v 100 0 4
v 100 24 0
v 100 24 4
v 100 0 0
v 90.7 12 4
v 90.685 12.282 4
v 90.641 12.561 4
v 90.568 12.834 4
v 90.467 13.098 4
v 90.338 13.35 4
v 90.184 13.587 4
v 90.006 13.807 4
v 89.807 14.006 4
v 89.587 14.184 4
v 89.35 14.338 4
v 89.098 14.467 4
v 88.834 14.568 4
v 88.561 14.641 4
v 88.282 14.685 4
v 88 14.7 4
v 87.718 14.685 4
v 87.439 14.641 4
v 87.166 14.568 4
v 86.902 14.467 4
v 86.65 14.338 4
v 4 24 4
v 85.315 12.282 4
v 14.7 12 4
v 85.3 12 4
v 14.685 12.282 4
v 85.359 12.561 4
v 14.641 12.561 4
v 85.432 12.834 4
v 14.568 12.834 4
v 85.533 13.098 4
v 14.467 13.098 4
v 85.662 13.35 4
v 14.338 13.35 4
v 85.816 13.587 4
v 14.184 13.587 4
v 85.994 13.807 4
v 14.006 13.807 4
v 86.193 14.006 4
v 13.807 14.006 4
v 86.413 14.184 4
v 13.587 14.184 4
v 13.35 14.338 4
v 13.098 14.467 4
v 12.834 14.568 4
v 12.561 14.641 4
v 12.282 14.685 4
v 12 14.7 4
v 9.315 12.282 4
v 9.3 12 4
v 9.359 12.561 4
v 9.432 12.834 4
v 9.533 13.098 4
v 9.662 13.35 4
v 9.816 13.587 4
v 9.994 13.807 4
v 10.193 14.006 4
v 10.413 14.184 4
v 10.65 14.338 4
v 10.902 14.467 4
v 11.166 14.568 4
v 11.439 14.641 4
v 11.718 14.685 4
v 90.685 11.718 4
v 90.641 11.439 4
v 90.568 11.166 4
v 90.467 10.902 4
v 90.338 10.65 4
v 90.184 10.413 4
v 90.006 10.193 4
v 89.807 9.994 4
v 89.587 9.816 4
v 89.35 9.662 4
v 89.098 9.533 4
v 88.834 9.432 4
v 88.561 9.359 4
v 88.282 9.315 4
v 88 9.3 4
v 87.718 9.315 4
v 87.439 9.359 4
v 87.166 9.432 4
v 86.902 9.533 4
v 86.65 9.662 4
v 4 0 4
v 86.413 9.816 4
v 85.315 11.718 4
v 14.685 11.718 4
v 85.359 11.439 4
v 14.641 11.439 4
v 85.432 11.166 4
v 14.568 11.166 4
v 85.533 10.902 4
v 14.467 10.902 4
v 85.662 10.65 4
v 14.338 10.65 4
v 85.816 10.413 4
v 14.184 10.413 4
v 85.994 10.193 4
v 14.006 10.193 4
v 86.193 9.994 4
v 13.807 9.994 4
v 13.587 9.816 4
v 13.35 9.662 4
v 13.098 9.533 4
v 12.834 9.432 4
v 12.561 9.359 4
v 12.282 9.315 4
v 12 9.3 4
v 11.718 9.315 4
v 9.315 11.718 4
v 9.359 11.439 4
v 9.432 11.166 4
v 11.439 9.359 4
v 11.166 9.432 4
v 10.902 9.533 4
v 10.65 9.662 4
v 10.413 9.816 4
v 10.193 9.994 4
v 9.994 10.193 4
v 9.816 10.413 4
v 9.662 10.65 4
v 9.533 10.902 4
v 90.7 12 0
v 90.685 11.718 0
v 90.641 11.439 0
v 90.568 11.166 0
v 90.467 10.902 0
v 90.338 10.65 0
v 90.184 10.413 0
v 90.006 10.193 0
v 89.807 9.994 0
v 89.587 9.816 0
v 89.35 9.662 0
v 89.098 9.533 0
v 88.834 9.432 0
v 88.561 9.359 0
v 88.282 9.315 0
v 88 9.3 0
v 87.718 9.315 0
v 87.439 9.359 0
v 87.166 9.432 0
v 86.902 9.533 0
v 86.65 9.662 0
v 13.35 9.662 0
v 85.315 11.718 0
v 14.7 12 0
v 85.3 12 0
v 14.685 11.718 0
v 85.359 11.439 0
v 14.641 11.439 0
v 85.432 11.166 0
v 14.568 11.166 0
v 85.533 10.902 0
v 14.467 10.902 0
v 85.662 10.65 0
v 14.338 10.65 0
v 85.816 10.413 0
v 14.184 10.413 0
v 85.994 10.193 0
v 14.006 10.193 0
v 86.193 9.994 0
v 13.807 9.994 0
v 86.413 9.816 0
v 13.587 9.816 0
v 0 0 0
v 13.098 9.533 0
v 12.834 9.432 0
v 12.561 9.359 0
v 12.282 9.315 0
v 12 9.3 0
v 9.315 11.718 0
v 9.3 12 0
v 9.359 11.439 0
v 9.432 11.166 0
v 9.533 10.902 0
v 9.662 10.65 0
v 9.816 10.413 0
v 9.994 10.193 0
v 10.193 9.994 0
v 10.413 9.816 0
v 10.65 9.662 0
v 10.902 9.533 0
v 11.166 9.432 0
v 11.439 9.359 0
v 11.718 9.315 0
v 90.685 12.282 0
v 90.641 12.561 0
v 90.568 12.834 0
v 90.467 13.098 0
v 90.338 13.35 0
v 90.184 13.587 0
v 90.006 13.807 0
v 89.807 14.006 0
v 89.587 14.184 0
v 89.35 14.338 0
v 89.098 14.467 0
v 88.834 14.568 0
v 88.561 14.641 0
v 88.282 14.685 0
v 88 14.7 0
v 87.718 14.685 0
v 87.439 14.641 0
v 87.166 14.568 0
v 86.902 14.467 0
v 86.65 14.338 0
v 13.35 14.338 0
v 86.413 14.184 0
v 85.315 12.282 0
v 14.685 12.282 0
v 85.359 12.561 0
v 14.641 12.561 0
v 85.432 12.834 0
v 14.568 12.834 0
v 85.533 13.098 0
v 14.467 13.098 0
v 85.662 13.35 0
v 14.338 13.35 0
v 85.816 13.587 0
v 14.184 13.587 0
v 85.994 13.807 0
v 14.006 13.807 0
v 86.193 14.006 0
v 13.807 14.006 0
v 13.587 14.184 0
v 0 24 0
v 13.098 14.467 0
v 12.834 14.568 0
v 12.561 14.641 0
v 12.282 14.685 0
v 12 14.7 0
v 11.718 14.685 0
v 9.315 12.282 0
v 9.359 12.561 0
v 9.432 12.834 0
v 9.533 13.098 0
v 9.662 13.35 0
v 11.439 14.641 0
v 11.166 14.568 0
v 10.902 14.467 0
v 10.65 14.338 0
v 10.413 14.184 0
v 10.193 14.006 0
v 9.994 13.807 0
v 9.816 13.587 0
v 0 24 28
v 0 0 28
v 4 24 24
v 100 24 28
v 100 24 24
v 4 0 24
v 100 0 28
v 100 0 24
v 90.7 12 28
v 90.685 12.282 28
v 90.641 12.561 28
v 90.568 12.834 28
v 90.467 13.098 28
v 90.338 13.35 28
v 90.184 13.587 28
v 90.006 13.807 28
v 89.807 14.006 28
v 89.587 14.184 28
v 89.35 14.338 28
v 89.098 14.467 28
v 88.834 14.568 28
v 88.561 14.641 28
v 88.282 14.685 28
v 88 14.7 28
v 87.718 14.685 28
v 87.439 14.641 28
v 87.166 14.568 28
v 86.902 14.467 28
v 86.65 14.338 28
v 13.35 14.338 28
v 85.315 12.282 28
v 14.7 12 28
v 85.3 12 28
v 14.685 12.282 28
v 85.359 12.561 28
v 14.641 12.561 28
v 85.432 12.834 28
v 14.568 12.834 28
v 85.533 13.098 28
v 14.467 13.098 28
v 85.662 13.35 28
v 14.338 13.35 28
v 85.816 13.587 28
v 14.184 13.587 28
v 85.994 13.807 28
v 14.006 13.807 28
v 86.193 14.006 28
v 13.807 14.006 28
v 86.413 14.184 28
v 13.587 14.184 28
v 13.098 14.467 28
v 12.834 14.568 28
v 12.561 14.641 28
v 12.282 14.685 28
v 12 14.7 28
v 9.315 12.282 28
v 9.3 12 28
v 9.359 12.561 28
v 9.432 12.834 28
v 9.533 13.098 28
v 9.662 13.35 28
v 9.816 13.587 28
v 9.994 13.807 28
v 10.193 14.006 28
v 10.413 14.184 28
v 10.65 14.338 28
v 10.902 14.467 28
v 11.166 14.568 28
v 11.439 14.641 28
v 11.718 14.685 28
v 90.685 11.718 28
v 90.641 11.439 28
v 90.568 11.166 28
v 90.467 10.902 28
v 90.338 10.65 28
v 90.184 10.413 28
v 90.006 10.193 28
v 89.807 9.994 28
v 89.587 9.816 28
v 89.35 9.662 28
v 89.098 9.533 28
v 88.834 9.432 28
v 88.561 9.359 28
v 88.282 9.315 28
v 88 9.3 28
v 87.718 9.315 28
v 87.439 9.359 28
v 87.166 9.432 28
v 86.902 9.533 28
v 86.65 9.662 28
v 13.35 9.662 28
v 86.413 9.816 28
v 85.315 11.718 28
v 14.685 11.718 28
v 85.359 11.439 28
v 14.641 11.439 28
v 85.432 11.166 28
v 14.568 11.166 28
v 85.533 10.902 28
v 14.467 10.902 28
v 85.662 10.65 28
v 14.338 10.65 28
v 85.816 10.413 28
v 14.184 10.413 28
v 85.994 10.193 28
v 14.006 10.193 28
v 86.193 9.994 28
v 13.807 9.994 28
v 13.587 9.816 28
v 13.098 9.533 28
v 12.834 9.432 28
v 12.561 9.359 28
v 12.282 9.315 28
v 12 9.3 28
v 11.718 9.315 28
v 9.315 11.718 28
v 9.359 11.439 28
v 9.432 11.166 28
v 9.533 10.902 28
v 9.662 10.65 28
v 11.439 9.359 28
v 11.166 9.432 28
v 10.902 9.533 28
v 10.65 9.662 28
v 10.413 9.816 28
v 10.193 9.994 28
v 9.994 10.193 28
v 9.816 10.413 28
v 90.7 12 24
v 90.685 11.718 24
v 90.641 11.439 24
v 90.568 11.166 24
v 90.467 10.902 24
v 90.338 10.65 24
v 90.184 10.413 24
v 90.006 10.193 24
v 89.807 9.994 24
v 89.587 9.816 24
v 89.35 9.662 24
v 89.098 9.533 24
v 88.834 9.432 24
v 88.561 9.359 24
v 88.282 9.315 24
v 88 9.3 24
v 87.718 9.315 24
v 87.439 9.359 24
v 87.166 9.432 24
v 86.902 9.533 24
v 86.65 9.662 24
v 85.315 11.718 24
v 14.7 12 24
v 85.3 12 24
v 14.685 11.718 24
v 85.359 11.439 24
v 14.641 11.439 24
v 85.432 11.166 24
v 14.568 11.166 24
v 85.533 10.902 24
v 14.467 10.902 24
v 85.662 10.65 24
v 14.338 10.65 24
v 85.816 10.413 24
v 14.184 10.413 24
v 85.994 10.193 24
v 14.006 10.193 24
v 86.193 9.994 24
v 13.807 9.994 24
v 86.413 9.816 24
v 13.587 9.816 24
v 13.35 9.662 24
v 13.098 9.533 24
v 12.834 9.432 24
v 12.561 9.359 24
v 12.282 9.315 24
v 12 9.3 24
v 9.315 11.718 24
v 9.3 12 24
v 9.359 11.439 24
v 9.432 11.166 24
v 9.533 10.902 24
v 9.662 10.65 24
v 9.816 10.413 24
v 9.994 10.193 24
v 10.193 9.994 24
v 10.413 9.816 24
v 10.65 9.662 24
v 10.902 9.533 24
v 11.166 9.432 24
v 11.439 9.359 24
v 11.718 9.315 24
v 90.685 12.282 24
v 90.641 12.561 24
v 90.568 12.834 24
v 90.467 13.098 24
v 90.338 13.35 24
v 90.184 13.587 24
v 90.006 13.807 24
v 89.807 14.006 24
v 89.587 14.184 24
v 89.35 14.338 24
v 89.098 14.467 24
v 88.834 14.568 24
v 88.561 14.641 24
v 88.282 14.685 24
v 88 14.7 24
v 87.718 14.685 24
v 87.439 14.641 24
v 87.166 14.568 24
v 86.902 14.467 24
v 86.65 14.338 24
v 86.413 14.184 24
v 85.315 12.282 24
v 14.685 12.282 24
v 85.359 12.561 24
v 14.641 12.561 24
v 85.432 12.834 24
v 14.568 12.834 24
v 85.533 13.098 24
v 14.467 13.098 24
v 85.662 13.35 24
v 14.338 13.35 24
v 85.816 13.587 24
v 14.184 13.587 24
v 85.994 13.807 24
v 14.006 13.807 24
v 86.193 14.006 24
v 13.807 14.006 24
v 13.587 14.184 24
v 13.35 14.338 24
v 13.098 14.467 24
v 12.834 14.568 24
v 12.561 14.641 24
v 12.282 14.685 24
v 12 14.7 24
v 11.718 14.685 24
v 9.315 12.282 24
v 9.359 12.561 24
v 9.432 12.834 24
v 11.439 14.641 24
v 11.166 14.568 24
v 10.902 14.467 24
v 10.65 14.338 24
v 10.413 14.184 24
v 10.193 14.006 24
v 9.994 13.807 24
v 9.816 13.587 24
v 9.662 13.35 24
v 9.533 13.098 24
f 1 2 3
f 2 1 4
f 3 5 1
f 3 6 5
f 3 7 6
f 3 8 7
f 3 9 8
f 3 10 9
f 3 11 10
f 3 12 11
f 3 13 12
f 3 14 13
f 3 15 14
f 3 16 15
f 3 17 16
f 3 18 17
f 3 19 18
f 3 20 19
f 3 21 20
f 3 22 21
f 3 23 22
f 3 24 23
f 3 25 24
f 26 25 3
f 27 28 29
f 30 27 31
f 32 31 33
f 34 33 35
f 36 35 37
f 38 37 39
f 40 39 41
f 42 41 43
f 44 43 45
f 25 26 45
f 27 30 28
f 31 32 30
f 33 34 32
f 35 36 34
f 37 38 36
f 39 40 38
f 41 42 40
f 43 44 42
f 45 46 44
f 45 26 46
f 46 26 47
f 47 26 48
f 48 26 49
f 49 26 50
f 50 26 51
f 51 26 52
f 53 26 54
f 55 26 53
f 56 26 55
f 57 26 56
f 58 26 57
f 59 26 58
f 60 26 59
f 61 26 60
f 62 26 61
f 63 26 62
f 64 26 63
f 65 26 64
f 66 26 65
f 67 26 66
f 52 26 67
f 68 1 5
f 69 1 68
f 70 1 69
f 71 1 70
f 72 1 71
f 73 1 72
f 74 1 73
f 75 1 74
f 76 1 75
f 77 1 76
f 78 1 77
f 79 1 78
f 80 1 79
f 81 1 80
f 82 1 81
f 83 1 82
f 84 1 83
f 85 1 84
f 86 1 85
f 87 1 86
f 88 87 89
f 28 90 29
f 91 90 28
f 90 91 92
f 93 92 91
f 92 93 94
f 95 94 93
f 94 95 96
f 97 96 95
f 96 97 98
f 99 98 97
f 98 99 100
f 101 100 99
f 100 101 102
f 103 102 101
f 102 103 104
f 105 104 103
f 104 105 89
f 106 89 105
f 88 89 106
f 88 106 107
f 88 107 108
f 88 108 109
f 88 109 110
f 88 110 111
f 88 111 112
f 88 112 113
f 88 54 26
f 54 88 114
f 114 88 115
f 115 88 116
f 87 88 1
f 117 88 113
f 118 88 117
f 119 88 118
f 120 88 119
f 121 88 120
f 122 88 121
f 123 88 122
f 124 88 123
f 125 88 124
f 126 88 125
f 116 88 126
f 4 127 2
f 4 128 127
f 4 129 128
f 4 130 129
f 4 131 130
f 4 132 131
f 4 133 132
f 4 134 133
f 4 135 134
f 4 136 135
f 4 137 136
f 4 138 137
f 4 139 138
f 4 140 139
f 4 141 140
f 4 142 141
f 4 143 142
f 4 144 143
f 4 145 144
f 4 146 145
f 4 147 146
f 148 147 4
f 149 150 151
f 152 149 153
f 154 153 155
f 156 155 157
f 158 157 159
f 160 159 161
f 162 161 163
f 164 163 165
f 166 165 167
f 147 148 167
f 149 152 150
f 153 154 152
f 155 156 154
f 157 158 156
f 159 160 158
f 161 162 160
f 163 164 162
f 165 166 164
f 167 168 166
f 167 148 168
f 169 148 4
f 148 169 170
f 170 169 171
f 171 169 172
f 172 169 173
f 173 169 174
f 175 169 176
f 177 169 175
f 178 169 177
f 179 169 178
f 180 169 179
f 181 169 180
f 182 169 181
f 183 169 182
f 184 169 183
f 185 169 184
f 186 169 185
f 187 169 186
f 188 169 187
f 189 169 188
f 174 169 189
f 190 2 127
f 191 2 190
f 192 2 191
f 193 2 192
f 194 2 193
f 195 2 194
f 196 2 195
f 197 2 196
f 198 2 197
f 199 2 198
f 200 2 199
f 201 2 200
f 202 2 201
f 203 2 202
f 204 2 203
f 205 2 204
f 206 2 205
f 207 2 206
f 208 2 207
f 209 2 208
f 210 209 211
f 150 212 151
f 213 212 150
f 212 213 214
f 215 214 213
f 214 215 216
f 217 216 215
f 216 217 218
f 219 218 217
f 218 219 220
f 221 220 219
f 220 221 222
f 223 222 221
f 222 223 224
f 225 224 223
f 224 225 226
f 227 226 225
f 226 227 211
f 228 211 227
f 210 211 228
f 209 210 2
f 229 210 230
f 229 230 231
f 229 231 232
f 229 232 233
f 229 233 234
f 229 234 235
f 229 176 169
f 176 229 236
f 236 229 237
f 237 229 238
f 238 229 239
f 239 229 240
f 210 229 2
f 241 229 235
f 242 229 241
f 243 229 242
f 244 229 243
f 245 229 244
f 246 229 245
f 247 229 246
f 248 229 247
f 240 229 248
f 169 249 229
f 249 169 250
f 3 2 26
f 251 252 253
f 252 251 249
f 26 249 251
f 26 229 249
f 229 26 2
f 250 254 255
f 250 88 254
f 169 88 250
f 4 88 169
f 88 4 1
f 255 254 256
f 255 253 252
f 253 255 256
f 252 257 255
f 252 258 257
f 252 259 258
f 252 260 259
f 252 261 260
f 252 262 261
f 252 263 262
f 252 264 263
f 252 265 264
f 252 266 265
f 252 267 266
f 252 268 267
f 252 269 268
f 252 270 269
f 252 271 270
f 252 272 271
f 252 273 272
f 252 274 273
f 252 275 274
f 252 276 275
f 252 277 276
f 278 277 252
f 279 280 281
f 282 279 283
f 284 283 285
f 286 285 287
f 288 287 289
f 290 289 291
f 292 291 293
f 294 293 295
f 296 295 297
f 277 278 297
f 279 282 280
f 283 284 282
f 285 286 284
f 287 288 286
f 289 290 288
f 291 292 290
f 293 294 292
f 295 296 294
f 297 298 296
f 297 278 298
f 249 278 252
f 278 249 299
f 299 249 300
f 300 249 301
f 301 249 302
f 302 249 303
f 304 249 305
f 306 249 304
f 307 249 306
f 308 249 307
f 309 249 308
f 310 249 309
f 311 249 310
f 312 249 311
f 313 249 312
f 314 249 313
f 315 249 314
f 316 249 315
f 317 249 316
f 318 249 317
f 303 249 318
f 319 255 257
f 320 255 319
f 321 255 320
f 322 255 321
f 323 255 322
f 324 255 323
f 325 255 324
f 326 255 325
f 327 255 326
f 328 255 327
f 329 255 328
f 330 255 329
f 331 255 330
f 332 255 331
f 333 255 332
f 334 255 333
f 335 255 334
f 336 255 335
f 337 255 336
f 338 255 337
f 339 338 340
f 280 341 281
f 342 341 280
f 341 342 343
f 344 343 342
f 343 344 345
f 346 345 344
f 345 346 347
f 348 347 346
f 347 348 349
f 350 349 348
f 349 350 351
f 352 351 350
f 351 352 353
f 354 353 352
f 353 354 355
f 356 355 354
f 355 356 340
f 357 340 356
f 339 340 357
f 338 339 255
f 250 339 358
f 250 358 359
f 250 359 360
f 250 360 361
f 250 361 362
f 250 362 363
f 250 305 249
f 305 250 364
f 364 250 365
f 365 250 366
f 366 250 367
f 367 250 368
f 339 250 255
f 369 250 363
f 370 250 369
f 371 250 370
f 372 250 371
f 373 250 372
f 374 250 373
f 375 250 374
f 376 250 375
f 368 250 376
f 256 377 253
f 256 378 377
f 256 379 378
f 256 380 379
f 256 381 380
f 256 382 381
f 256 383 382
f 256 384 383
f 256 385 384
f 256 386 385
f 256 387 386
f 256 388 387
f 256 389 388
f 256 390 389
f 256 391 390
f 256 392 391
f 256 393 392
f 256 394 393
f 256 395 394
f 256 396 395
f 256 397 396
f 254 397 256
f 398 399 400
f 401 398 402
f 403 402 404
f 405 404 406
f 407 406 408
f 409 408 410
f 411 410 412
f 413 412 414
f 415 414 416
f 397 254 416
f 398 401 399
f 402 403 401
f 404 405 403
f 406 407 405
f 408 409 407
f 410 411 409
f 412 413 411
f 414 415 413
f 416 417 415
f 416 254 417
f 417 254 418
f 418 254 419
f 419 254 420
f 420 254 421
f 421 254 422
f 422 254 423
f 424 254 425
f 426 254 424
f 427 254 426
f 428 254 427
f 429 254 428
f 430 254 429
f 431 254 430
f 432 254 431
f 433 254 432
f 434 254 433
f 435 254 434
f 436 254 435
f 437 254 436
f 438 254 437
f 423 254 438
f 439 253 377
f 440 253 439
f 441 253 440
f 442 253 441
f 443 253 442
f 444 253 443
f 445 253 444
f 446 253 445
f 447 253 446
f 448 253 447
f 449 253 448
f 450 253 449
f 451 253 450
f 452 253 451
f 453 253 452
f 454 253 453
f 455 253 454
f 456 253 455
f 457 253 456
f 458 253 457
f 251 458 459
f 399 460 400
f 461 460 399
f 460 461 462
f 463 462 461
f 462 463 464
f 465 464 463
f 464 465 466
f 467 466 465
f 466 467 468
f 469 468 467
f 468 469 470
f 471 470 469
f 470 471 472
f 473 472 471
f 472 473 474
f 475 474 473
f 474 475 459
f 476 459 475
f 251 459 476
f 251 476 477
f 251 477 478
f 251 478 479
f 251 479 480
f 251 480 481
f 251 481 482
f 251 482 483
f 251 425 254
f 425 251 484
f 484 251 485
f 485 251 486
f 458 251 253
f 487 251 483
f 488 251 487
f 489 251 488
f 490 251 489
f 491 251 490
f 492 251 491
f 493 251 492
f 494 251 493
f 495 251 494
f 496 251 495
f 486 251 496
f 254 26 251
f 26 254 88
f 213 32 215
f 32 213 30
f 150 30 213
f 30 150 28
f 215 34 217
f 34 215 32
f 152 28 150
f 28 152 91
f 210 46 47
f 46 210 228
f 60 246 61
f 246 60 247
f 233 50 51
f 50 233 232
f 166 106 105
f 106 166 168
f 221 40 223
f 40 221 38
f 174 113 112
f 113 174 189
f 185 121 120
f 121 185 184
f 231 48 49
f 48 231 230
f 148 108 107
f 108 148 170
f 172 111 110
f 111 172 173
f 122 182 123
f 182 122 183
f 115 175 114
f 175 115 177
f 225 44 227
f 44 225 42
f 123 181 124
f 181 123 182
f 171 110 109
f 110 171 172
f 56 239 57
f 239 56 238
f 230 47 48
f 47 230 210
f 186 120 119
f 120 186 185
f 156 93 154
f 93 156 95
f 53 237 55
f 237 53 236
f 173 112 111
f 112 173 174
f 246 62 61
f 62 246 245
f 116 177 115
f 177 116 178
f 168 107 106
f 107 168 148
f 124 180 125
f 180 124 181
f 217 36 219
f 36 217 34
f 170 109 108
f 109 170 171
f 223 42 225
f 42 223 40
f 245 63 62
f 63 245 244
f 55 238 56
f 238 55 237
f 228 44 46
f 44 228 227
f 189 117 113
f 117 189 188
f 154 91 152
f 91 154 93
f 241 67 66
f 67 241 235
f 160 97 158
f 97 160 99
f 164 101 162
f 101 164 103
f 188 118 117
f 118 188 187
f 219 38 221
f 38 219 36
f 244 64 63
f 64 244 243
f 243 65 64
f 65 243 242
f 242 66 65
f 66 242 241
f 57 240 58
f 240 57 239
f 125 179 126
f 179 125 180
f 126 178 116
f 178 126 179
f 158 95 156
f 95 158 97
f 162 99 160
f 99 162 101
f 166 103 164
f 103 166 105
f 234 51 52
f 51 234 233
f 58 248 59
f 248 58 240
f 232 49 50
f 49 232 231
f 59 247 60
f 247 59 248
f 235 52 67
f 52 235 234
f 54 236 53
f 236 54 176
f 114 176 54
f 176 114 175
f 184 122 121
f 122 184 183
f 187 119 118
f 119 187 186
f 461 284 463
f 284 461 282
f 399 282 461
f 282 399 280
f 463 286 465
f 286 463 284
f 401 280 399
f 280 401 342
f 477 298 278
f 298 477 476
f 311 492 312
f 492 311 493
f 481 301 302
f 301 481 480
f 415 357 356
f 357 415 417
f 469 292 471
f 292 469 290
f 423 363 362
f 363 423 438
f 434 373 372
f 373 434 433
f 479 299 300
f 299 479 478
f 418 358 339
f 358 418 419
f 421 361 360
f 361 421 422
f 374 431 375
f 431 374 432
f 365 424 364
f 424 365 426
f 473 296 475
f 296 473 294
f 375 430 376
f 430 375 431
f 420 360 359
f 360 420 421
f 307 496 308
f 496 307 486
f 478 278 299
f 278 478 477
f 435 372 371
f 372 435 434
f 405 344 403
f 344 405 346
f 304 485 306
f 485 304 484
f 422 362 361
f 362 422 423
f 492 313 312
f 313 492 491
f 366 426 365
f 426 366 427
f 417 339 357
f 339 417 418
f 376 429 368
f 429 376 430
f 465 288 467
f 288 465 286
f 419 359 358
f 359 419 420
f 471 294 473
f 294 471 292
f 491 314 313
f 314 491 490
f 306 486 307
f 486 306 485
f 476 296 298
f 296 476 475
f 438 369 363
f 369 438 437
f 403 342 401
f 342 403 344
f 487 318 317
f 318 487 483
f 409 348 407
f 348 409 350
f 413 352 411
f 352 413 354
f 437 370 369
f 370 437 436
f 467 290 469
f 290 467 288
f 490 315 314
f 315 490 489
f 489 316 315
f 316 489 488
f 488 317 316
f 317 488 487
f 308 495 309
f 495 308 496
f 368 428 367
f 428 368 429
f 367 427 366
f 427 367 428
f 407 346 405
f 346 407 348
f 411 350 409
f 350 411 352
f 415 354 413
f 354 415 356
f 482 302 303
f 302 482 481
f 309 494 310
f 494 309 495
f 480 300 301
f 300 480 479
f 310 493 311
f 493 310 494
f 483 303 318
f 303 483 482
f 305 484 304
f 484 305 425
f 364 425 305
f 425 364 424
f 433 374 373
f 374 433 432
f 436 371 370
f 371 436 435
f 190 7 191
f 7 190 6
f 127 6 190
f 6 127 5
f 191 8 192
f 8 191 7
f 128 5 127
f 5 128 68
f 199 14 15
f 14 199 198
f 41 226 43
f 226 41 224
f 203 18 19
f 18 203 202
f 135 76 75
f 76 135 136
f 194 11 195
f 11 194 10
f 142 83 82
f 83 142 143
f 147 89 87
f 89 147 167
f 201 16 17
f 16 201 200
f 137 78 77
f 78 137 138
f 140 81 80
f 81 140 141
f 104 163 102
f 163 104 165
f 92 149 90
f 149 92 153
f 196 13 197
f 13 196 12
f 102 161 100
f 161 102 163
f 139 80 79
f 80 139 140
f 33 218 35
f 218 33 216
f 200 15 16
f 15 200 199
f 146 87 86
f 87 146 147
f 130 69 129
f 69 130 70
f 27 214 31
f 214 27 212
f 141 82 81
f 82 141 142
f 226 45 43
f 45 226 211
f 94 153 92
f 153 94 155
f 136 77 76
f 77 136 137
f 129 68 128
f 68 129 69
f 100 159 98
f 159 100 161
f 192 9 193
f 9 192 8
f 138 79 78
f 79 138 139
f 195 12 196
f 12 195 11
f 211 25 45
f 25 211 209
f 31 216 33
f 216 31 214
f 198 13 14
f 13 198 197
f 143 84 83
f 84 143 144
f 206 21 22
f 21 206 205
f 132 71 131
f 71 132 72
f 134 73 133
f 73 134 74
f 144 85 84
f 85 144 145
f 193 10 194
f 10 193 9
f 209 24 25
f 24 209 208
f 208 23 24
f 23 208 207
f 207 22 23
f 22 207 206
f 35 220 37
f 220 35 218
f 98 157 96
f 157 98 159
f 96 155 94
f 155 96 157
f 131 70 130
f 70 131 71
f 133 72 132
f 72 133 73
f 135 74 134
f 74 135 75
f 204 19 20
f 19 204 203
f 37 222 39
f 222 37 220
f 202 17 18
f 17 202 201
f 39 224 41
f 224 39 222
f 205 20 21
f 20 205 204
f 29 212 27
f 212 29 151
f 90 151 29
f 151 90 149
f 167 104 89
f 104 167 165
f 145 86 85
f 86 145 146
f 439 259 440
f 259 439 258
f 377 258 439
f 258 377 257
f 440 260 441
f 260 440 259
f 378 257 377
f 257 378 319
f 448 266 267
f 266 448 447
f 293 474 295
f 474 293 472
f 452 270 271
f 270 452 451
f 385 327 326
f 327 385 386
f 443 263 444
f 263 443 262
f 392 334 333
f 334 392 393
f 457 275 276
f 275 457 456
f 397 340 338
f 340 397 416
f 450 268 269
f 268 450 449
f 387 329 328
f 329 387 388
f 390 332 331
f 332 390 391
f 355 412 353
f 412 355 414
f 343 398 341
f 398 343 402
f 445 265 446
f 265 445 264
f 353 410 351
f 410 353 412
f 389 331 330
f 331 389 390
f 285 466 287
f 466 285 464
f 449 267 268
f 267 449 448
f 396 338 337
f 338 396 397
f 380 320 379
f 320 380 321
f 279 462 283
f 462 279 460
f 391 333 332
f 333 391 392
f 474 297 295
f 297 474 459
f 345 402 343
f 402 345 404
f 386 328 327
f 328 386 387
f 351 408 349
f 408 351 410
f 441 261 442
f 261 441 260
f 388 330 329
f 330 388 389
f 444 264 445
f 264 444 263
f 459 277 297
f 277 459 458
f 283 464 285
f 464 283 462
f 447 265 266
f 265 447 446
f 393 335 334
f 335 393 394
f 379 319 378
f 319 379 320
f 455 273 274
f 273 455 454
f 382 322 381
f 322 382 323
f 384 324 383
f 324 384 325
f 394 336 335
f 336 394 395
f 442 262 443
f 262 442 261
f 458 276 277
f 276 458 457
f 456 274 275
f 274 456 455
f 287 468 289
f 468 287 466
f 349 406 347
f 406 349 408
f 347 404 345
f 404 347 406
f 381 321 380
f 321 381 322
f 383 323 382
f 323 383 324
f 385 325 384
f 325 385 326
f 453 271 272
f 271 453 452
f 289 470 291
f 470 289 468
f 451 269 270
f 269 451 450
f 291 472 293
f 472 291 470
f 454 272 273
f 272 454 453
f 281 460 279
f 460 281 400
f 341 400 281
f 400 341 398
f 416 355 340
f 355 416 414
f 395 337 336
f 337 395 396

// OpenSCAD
// Z-offset mounting bracket.
$fn = 60;
eps = 0.02;
length = 100;
height = 24;
width = 24;
thickness = 4;
difference() {
    union() {
        cube([length,width,thickness]);
        translate([0,0,height]) cube([length,width,thickness]);
        translate([0,0,thickness]) cube([thickness,width,height-thickness]);
    }
    for (x=[12,length-12]) {
        translate([x,width/2,-eps]) cylinder(d=5.4,h=thickness+2*eps);
        translate([x,width/2,height-eps]) cylinder(d=5.4,h=thickness+2*eps);
    }
}
